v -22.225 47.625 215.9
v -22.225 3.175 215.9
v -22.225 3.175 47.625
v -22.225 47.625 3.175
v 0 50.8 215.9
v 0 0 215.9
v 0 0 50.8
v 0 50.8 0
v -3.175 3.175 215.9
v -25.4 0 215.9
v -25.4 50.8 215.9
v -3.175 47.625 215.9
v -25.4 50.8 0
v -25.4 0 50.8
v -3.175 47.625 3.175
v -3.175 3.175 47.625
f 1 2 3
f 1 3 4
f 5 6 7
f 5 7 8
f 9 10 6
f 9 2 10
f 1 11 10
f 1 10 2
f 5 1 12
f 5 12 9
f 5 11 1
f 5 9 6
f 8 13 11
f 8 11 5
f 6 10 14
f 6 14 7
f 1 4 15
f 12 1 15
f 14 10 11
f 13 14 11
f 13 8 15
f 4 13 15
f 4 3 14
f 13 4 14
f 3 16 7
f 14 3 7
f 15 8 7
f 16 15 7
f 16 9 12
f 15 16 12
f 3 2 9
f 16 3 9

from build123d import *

# Parameters (mm, degrees)
SKETCH1_W           = 25.4
SKETCH1_H           = 50.8
SKETCH1_W_2         = 19.05
SKETCH1_H_2         = 44.45
BOSS_EXTRUDE1_DEPTH = 215.9
CUT_EXTRUDE1_DEPTH  = 25.4


with BuildPart() as part:
    # Sketch1 → Boss-Extrude1 (new body)
    with BuildSketch(Plane.XY):
        with Locations((-12.7, 25.4)):
            Rectangle(SKETCH1_W, SKETCH1_H)
        with Locations((-12.7, 25.4)):
            Rectangle(SKETCH1_W_2, SKETCH1_H_2, mode=Mode.SUBTRACT)
    extrude(amount=BOSS_EXTRUDE1_DEPTH)

    # Sketch2 → Cut-Extrude1 (cut)
    with BuildSketch(Plane(origin=(0, 0, 0), x_dir=(0, 0, -1), z_dir=(1, 0, 0))):
        Polygon((0, 50.8), (-50.8, 0), (0, 0), align=None)
    extrude(amount=-CUT_EXTRUDE1_DEPTH, mode=Mode.SUBTRACT)


solid = part.part
